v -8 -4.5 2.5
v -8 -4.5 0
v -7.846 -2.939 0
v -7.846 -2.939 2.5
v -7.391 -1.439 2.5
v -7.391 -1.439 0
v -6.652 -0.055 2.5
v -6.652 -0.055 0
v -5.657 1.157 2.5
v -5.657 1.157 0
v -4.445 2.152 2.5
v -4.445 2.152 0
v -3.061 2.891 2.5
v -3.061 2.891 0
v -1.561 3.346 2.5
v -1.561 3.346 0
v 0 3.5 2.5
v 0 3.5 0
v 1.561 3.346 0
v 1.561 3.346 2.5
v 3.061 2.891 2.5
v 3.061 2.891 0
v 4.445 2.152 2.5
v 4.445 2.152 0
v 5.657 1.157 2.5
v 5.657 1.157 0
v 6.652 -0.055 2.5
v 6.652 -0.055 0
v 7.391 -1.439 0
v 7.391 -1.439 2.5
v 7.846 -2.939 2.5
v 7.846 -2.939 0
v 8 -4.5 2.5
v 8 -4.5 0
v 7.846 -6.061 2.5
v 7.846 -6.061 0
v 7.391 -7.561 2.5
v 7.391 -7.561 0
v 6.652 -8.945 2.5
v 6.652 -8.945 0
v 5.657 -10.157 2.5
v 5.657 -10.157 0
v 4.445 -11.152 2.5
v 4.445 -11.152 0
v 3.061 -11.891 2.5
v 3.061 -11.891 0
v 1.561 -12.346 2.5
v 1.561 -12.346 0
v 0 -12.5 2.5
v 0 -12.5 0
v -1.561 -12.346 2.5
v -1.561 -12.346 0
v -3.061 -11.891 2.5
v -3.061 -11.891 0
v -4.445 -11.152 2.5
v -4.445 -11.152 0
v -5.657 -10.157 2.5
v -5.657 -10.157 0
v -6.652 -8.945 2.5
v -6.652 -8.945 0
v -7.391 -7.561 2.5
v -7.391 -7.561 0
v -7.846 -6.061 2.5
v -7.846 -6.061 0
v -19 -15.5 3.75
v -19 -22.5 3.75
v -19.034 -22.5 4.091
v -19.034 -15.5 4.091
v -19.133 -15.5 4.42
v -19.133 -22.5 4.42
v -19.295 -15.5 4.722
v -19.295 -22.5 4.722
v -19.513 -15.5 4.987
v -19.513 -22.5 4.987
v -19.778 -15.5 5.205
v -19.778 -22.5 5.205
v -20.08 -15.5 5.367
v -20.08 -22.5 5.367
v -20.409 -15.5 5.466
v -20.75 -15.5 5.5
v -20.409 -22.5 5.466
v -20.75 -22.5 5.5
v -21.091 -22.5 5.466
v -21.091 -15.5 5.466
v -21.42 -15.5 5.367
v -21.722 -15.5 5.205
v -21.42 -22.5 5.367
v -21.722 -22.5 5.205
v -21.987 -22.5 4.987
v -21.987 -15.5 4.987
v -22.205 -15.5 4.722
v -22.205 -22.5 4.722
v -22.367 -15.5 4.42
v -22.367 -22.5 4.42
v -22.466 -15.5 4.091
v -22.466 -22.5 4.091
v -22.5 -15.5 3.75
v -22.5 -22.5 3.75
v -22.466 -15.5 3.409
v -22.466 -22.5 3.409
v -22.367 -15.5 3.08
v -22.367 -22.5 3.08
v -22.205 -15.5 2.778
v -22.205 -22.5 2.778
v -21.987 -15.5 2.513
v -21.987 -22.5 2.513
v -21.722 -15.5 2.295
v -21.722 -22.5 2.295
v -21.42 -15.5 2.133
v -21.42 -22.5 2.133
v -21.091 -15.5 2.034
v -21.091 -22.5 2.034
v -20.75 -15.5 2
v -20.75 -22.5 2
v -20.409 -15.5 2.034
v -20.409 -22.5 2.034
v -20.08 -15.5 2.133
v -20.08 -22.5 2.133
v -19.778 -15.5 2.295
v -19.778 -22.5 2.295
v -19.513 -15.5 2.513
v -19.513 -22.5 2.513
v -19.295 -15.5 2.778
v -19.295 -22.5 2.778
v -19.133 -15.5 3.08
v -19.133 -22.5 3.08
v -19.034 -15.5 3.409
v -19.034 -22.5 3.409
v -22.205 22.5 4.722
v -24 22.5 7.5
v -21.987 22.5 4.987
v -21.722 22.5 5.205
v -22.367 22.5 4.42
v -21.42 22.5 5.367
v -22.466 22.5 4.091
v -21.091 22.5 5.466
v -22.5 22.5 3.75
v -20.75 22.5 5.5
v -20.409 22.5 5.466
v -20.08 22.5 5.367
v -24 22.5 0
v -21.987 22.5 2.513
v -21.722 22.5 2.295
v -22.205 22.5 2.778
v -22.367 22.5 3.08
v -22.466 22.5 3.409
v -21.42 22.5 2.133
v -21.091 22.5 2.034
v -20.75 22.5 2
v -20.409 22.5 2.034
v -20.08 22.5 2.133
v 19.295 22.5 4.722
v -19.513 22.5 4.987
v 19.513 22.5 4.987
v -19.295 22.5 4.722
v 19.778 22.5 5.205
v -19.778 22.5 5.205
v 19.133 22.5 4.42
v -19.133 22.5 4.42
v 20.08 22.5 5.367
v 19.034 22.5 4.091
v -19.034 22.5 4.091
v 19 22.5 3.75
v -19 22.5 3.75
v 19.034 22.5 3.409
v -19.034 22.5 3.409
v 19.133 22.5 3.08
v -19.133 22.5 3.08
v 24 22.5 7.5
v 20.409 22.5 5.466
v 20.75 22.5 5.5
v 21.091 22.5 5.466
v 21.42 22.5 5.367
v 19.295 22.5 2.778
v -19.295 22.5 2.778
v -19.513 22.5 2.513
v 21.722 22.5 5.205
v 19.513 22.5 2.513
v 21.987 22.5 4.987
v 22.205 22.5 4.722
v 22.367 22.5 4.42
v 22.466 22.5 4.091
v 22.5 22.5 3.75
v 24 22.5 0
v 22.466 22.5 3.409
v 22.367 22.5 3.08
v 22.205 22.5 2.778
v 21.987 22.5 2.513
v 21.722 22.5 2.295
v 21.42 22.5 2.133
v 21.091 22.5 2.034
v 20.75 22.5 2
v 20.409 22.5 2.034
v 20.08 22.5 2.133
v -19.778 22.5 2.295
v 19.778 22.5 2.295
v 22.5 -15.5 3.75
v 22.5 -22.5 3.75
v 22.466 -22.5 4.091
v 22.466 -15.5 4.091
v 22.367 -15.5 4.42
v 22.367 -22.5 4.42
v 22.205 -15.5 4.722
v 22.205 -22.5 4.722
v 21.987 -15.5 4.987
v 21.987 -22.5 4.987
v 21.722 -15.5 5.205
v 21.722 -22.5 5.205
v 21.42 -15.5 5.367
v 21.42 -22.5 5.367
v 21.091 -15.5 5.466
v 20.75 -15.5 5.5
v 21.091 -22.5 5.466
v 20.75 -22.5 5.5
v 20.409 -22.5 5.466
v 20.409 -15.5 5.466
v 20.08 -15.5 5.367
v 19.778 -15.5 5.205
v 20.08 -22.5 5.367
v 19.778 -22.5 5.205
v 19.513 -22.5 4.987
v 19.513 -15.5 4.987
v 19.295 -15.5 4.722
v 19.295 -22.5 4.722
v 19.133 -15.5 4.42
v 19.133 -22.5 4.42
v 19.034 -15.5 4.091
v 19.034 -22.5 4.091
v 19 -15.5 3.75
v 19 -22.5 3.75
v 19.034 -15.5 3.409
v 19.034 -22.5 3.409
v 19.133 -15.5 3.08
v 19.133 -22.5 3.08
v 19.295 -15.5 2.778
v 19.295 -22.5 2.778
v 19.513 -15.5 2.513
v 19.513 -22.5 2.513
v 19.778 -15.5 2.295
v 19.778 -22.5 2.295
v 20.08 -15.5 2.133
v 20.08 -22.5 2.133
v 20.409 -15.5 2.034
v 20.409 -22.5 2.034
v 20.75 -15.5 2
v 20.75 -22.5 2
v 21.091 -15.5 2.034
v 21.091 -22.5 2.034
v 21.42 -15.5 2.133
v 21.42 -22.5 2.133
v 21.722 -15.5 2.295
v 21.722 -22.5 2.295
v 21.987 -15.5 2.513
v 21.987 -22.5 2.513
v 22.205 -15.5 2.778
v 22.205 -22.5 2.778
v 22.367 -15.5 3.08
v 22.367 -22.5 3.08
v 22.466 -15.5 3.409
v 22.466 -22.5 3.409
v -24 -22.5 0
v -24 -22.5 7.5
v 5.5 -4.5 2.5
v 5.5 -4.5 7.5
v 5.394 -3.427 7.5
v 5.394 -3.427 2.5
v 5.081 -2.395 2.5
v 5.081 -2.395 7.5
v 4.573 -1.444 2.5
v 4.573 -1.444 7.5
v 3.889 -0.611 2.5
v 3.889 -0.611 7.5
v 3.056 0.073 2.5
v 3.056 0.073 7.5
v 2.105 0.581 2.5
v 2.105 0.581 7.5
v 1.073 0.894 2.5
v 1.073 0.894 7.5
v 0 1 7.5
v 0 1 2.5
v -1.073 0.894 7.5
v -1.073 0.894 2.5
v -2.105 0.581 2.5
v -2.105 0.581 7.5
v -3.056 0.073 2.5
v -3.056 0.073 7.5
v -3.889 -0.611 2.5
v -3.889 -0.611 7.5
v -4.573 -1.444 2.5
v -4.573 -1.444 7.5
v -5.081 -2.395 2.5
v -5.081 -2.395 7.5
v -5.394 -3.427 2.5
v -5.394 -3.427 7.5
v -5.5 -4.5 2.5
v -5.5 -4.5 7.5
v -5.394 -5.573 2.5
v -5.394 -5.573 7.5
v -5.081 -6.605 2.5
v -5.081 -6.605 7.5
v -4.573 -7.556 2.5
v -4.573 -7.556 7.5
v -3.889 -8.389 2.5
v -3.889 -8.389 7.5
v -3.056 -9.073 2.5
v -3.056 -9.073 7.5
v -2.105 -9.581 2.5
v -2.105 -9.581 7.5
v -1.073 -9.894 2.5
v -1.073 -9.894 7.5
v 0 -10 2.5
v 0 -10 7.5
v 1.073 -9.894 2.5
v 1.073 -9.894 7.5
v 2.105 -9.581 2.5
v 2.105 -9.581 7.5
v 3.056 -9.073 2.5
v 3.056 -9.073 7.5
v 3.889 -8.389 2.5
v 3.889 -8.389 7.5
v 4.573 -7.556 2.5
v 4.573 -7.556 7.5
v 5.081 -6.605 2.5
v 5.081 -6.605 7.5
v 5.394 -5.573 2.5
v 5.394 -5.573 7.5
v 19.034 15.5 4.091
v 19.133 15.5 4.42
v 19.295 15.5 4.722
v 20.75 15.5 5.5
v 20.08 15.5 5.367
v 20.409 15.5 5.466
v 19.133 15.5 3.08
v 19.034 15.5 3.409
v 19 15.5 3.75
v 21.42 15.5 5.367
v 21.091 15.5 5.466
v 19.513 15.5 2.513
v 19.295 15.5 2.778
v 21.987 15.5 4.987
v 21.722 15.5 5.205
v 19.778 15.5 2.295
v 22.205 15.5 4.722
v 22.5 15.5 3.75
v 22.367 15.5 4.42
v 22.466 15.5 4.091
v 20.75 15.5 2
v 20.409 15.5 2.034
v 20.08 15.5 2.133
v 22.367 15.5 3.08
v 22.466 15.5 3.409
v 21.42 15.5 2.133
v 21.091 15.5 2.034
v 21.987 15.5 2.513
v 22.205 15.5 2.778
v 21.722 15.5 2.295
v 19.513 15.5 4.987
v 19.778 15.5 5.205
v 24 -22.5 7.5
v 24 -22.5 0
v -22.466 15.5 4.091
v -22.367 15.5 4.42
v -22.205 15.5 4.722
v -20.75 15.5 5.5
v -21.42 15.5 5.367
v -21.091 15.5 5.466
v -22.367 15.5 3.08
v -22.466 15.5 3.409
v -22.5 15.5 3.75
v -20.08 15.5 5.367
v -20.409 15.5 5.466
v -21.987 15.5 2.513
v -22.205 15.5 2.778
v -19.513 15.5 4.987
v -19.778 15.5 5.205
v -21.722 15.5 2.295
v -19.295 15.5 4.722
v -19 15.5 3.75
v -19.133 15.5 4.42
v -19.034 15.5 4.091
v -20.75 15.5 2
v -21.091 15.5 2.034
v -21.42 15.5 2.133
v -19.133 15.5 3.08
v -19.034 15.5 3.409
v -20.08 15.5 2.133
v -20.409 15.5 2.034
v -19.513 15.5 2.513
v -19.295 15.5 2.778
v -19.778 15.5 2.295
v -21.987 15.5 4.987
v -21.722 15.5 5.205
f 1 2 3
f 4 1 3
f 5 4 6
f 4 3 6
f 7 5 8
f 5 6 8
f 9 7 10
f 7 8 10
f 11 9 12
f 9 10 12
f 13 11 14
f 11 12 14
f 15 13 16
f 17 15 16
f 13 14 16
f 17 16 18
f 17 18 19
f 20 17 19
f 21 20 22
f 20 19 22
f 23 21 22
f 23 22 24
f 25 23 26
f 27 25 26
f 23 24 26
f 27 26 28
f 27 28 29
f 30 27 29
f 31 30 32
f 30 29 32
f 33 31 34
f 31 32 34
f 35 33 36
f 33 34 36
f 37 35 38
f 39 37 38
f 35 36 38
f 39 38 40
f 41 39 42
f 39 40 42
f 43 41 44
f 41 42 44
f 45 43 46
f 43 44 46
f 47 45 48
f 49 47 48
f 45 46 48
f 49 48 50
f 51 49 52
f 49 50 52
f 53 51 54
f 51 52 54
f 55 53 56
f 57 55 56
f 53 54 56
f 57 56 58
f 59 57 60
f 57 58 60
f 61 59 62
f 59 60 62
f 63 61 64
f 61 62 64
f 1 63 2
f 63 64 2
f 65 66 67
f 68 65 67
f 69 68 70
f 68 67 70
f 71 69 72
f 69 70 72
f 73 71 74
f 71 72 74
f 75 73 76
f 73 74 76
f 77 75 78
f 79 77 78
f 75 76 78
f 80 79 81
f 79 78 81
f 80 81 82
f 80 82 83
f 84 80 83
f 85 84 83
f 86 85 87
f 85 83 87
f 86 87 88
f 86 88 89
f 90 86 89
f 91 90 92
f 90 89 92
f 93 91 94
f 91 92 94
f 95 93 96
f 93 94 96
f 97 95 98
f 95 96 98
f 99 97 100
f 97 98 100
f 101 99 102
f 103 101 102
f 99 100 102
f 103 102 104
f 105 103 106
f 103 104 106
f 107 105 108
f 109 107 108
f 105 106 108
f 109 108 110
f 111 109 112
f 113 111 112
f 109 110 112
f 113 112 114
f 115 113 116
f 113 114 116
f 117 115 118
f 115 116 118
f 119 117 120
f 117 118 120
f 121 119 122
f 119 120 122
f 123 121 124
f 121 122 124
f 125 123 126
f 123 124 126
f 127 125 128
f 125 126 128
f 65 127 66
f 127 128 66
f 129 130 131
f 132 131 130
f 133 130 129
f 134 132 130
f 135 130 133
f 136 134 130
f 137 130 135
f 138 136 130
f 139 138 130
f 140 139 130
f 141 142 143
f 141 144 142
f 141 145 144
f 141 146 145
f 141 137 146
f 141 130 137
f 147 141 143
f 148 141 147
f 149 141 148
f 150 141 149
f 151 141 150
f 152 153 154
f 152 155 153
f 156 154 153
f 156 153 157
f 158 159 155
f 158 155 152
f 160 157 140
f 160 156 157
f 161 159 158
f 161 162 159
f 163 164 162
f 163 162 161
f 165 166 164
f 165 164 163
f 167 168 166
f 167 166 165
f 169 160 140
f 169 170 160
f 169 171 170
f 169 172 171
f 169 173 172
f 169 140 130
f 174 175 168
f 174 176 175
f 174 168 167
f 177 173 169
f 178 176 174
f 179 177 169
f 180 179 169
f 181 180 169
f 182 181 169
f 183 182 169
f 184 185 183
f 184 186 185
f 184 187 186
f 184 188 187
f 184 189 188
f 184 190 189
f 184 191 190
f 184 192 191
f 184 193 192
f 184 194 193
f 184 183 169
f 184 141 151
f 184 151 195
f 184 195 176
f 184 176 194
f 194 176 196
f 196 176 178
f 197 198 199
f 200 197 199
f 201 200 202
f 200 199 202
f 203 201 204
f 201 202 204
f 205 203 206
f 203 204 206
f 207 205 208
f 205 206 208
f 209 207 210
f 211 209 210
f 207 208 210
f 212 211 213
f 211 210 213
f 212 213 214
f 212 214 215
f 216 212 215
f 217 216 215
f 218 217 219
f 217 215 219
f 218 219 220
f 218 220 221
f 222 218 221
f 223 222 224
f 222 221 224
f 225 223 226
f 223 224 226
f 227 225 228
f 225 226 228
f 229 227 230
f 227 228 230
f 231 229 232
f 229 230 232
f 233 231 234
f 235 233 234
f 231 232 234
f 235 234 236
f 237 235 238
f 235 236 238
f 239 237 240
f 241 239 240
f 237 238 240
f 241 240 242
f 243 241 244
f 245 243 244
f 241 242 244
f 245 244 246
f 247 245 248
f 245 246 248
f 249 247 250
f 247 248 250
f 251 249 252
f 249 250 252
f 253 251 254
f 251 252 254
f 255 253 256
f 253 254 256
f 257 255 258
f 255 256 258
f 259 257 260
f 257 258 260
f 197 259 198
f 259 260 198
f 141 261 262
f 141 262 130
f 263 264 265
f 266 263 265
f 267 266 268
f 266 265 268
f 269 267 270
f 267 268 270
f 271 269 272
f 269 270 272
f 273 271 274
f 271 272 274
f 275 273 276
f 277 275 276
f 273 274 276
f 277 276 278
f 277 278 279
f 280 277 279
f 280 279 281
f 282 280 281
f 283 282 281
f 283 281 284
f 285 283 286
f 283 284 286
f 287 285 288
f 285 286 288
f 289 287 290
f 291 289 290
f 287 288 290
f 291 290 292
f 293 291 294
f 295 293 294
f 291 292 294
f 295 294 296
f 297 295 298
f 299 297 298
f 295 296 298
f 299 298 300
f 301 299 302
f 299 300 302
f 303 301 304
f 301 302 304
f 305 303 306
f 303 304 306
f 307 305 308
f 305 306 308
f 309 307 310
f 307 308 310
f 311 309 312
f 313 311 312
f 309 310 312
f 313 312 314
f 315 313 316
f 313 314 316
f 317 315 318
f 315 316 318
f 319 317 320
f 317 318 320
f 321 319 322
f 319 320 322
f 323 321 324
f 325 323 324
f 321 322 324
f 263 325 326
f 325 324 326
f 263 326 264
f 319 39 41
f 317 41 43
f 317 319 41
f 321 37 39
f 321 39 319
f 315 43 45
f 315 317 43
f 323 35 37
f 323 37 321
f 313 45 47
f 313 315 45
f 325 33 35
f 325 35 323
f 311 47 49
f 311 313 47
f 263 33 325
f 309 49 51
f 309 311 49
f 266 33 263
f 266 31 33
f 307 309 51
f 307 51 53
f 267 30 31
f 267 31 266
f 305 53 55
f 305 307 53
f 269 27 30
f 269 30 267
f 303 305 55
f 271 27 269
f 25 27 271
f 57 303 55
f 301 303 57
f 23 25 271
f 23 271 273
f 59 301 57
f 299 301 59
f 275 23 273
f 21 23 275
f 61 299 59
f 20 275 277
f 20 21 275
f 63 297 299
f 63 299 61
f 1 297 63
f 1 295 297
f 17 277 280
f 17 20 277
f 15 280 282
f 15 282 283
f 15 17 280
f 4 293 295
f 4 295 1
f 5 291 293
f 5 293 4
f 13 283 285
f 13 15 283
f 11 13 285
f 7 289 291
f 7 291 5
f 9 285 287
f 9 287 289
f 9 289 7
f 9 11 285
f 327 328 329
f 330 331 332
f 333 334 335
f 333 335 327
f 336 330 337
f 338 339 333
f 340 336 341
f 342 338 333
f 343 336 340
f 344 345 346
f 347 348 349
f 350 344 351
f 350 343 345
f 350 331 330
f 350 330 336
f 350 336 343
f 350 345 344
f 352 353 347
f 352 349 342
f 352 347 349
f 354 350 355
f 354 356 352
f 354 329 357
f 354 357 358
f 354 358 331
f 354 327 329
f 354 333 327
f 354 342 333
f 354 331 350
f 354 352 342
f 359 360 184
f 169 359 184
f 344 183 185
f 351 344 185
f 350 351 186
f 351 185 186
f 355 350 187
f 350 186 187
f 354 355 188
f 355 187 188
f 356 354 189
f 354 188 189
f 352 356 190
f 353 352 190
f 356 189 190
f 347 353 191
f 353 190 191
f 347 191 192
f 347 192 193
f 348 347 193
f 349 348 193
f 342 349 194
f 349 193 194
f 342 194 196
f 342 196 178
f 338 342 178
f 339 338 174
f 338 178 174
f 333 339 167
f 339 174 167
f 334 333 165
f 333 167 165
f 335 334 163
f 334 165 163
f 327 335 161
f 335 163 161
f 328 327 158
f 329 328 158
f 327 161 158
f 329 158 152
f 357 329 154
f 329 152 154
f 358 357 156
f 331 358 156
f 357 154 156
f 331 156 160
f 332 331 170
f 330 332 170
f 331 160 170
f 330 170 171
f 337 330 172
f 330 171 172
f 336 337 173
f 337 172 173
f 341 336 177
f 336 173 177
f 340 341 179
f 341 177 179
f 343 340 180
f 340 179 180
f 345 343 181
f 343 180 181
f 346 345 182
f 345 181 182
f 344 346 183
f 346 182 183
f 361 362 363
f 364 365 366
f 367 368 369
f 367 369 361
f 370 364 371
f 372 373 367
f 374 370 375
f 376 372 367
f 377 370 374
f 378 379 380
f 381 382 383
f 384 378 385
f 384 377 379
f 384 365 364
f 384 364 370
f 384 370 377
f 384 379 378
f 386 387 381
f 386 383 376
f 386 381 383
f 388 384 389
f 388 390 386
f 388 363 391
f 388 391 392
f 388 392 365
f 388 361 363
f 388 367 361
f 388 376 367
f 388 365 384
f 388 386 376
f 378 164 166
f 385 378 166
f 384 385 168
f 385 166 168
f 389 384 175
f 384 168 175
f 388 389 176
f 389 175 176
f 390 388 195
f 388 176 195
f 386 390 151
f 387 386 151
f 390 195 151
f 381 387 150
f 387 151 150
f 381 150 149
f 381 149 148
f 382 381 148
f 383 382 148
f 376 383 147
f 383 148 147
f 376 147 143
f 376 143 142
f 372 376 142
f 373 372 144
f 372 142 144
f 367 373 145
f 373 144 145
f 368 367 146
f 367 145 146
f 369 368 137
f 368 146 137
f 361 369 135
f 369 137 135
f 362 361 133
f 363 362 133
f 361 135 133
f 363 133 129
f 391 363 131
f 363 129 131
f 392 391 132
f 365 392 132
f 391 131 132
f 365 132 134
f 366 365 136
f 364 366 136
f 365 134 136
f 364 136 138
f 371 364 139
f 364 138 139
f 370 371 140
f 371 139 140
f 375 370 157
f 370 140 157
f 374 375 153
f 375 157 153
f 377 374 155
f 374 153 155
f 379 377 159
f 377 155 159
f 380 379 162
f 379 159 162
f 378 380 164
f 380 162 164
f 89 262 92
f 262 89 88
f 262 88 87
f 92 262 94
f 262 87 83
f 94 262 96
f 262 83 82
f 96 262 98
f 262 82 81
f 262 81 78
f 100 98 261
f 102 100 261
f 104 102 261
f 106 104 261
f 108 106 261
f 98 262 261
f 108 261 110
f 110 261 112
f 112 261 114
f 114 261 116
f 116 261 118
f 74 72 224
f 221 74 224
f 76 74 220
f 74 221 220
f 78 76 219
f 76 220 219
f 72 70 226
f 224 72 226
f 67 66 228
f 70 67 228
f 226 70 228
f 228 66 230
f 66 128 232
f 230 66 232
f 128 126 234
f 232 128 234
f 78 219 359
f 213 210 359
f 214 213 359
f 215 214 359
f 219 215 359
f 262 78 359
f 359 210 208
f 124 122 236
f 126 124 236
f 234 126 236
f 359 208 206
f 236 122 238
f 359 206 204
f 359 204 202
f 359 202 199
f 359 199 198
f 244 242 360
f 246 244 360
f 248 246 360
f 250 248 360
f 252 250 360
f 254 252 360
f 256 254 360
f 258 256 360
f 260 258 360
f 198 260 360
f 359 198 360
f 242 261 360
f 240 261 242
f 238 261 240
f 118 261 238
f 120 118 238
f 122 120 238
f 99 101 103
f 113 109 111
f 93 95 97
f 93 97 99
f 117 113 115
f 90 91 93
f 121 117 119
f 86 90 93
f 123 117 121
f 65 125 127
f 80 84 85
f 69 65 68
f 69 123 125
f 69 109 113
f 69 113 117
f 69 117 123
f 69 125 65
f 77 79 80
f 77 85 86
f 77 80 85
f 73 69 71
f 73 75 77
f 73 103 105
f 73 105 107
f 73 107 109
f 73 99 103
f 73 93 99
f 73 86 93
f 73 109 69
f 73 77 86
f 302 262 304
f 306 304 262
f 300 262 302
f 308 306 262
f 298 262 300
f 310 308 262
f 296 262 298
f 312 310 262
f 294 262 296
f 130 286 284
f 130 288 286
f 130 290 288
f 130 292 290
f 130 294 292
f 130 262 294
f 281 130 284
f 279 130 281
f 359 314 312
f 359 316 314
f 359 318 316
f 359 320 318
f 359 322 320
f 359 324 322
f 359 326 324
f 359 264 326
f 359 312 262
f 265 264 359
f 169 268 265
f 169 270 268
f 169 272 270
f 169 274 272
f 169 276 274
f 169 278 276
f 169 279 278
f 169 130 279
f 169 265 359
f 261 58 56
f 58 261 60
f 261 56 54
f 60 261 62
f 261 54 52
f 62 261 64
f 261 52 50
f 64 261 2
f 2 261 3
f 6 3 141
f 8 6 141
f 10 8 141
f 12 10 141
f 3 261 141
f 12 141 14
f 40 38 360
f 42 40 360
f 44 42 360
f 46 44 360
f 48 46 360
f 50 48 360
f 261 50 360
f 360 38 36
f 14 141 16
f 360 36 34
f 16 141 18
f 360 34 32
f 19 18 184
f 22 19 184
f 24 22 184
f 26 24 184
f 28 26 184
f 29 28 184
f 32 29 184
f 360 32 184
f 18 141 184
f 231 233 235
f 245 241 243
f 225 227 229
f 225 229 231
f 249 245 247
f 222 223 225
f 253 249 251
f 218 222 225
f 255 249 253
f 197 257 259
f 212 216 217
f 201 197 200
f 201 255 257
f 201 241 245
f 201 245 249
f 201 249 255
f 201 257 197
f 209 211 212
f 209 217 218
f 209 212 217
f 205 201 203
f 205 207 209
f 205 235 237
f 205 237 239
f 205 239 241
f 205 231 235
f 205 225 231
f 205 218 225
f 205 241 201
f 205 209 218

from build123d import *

# Parameters (mm, degrees)
ESQUISSE1_W             = 48
ESQUISSE1_H             = 45
BOSS_EXTRU_1_DEPTH      = 7.5
ESQUISSE2_R             = 1.75
ENL_V_MAT_EXTRU_1_DEPTH = 7
ESQUISSE3_R             = 1.75
ENL_V_MAT_EXTRU_2_DEPTH = 7
ESQUISSE5_R             = 5.5
ENL_V_MAT_EXTRU_3_DEPTH = 5
ESQUISSE4_R             = 8
ENL_V_MAT_EXTRU_4_DEPTH = 2.5


with BuildPart() as part:
    # Esquisse1 → Boss.-Extru.1 (new body)
    with BuildSketch(Plane.XY):
        Rectangle(ESQUISSE1_W, ESQUISSE1_H)
    extrude(amount=BOSS_EXTRU_1_DEPTH)

    # Esquisse2 → Enlèv. mat.-Extru.1 (cut)
    with BuildSketch(Plane.XZ.offset(22.5)):
        with Locations((-20.75, 3.75)):
            Circle(ESQUISSE2_R)
        with Locations((20.75, 3.75)):
            Circle(ESQUISSE2_R)
    extrude(amount=-ENL_V_MAT_EXTRU_1_DEPTH, mode=Mode.SUBTRACT)

    # Esquisse3 → Enlèv. mat.-Extru.2 (cut)
    with BuildSketch(Plane(origin=(0, 22.5, 0), x_dir=(1, 0, 0), z_dir=(0, 1, 0))):
        with Locations((-20.75, -3.75)):
            Circle(ESQUISSE3_R)
        with Locations((20.75, -3.75)):
            Circle(ESQUISSE3_R)
    extrude(amount=-ENL_V_MAT_EXTRU_2_DEPTH, mode=Mode.SUBTRACT)

    # Esquisse5 → Enlèv. mat.-Extru.3 (cut)
    with BuildSketch(Plane.XY.offset(7.5)):
        with Locations((0, -4.5)):
            Circle(ESQUISSE5_R)
    extrude(amount=-ENL_V_MAT_EXTRU_3_DEPTH, mode=Mode.SUBTRACT)

    # Esquisse4 → Enlèv. mat.-Extru.4 (cut)
    with BuildSketch(Plane(origin=(0, 0, 0), x_dir=(-1, 0, 0), z_dir=(0, 0, -1))):
        with Locations((0, -4.5)):
            Circle(ESQUISSE4_R)
    extrude(amount=-ENL_V_MAT_EXTRU_4_DEPTH, mode=Mode.SUBTRACT)


solid = part.part
